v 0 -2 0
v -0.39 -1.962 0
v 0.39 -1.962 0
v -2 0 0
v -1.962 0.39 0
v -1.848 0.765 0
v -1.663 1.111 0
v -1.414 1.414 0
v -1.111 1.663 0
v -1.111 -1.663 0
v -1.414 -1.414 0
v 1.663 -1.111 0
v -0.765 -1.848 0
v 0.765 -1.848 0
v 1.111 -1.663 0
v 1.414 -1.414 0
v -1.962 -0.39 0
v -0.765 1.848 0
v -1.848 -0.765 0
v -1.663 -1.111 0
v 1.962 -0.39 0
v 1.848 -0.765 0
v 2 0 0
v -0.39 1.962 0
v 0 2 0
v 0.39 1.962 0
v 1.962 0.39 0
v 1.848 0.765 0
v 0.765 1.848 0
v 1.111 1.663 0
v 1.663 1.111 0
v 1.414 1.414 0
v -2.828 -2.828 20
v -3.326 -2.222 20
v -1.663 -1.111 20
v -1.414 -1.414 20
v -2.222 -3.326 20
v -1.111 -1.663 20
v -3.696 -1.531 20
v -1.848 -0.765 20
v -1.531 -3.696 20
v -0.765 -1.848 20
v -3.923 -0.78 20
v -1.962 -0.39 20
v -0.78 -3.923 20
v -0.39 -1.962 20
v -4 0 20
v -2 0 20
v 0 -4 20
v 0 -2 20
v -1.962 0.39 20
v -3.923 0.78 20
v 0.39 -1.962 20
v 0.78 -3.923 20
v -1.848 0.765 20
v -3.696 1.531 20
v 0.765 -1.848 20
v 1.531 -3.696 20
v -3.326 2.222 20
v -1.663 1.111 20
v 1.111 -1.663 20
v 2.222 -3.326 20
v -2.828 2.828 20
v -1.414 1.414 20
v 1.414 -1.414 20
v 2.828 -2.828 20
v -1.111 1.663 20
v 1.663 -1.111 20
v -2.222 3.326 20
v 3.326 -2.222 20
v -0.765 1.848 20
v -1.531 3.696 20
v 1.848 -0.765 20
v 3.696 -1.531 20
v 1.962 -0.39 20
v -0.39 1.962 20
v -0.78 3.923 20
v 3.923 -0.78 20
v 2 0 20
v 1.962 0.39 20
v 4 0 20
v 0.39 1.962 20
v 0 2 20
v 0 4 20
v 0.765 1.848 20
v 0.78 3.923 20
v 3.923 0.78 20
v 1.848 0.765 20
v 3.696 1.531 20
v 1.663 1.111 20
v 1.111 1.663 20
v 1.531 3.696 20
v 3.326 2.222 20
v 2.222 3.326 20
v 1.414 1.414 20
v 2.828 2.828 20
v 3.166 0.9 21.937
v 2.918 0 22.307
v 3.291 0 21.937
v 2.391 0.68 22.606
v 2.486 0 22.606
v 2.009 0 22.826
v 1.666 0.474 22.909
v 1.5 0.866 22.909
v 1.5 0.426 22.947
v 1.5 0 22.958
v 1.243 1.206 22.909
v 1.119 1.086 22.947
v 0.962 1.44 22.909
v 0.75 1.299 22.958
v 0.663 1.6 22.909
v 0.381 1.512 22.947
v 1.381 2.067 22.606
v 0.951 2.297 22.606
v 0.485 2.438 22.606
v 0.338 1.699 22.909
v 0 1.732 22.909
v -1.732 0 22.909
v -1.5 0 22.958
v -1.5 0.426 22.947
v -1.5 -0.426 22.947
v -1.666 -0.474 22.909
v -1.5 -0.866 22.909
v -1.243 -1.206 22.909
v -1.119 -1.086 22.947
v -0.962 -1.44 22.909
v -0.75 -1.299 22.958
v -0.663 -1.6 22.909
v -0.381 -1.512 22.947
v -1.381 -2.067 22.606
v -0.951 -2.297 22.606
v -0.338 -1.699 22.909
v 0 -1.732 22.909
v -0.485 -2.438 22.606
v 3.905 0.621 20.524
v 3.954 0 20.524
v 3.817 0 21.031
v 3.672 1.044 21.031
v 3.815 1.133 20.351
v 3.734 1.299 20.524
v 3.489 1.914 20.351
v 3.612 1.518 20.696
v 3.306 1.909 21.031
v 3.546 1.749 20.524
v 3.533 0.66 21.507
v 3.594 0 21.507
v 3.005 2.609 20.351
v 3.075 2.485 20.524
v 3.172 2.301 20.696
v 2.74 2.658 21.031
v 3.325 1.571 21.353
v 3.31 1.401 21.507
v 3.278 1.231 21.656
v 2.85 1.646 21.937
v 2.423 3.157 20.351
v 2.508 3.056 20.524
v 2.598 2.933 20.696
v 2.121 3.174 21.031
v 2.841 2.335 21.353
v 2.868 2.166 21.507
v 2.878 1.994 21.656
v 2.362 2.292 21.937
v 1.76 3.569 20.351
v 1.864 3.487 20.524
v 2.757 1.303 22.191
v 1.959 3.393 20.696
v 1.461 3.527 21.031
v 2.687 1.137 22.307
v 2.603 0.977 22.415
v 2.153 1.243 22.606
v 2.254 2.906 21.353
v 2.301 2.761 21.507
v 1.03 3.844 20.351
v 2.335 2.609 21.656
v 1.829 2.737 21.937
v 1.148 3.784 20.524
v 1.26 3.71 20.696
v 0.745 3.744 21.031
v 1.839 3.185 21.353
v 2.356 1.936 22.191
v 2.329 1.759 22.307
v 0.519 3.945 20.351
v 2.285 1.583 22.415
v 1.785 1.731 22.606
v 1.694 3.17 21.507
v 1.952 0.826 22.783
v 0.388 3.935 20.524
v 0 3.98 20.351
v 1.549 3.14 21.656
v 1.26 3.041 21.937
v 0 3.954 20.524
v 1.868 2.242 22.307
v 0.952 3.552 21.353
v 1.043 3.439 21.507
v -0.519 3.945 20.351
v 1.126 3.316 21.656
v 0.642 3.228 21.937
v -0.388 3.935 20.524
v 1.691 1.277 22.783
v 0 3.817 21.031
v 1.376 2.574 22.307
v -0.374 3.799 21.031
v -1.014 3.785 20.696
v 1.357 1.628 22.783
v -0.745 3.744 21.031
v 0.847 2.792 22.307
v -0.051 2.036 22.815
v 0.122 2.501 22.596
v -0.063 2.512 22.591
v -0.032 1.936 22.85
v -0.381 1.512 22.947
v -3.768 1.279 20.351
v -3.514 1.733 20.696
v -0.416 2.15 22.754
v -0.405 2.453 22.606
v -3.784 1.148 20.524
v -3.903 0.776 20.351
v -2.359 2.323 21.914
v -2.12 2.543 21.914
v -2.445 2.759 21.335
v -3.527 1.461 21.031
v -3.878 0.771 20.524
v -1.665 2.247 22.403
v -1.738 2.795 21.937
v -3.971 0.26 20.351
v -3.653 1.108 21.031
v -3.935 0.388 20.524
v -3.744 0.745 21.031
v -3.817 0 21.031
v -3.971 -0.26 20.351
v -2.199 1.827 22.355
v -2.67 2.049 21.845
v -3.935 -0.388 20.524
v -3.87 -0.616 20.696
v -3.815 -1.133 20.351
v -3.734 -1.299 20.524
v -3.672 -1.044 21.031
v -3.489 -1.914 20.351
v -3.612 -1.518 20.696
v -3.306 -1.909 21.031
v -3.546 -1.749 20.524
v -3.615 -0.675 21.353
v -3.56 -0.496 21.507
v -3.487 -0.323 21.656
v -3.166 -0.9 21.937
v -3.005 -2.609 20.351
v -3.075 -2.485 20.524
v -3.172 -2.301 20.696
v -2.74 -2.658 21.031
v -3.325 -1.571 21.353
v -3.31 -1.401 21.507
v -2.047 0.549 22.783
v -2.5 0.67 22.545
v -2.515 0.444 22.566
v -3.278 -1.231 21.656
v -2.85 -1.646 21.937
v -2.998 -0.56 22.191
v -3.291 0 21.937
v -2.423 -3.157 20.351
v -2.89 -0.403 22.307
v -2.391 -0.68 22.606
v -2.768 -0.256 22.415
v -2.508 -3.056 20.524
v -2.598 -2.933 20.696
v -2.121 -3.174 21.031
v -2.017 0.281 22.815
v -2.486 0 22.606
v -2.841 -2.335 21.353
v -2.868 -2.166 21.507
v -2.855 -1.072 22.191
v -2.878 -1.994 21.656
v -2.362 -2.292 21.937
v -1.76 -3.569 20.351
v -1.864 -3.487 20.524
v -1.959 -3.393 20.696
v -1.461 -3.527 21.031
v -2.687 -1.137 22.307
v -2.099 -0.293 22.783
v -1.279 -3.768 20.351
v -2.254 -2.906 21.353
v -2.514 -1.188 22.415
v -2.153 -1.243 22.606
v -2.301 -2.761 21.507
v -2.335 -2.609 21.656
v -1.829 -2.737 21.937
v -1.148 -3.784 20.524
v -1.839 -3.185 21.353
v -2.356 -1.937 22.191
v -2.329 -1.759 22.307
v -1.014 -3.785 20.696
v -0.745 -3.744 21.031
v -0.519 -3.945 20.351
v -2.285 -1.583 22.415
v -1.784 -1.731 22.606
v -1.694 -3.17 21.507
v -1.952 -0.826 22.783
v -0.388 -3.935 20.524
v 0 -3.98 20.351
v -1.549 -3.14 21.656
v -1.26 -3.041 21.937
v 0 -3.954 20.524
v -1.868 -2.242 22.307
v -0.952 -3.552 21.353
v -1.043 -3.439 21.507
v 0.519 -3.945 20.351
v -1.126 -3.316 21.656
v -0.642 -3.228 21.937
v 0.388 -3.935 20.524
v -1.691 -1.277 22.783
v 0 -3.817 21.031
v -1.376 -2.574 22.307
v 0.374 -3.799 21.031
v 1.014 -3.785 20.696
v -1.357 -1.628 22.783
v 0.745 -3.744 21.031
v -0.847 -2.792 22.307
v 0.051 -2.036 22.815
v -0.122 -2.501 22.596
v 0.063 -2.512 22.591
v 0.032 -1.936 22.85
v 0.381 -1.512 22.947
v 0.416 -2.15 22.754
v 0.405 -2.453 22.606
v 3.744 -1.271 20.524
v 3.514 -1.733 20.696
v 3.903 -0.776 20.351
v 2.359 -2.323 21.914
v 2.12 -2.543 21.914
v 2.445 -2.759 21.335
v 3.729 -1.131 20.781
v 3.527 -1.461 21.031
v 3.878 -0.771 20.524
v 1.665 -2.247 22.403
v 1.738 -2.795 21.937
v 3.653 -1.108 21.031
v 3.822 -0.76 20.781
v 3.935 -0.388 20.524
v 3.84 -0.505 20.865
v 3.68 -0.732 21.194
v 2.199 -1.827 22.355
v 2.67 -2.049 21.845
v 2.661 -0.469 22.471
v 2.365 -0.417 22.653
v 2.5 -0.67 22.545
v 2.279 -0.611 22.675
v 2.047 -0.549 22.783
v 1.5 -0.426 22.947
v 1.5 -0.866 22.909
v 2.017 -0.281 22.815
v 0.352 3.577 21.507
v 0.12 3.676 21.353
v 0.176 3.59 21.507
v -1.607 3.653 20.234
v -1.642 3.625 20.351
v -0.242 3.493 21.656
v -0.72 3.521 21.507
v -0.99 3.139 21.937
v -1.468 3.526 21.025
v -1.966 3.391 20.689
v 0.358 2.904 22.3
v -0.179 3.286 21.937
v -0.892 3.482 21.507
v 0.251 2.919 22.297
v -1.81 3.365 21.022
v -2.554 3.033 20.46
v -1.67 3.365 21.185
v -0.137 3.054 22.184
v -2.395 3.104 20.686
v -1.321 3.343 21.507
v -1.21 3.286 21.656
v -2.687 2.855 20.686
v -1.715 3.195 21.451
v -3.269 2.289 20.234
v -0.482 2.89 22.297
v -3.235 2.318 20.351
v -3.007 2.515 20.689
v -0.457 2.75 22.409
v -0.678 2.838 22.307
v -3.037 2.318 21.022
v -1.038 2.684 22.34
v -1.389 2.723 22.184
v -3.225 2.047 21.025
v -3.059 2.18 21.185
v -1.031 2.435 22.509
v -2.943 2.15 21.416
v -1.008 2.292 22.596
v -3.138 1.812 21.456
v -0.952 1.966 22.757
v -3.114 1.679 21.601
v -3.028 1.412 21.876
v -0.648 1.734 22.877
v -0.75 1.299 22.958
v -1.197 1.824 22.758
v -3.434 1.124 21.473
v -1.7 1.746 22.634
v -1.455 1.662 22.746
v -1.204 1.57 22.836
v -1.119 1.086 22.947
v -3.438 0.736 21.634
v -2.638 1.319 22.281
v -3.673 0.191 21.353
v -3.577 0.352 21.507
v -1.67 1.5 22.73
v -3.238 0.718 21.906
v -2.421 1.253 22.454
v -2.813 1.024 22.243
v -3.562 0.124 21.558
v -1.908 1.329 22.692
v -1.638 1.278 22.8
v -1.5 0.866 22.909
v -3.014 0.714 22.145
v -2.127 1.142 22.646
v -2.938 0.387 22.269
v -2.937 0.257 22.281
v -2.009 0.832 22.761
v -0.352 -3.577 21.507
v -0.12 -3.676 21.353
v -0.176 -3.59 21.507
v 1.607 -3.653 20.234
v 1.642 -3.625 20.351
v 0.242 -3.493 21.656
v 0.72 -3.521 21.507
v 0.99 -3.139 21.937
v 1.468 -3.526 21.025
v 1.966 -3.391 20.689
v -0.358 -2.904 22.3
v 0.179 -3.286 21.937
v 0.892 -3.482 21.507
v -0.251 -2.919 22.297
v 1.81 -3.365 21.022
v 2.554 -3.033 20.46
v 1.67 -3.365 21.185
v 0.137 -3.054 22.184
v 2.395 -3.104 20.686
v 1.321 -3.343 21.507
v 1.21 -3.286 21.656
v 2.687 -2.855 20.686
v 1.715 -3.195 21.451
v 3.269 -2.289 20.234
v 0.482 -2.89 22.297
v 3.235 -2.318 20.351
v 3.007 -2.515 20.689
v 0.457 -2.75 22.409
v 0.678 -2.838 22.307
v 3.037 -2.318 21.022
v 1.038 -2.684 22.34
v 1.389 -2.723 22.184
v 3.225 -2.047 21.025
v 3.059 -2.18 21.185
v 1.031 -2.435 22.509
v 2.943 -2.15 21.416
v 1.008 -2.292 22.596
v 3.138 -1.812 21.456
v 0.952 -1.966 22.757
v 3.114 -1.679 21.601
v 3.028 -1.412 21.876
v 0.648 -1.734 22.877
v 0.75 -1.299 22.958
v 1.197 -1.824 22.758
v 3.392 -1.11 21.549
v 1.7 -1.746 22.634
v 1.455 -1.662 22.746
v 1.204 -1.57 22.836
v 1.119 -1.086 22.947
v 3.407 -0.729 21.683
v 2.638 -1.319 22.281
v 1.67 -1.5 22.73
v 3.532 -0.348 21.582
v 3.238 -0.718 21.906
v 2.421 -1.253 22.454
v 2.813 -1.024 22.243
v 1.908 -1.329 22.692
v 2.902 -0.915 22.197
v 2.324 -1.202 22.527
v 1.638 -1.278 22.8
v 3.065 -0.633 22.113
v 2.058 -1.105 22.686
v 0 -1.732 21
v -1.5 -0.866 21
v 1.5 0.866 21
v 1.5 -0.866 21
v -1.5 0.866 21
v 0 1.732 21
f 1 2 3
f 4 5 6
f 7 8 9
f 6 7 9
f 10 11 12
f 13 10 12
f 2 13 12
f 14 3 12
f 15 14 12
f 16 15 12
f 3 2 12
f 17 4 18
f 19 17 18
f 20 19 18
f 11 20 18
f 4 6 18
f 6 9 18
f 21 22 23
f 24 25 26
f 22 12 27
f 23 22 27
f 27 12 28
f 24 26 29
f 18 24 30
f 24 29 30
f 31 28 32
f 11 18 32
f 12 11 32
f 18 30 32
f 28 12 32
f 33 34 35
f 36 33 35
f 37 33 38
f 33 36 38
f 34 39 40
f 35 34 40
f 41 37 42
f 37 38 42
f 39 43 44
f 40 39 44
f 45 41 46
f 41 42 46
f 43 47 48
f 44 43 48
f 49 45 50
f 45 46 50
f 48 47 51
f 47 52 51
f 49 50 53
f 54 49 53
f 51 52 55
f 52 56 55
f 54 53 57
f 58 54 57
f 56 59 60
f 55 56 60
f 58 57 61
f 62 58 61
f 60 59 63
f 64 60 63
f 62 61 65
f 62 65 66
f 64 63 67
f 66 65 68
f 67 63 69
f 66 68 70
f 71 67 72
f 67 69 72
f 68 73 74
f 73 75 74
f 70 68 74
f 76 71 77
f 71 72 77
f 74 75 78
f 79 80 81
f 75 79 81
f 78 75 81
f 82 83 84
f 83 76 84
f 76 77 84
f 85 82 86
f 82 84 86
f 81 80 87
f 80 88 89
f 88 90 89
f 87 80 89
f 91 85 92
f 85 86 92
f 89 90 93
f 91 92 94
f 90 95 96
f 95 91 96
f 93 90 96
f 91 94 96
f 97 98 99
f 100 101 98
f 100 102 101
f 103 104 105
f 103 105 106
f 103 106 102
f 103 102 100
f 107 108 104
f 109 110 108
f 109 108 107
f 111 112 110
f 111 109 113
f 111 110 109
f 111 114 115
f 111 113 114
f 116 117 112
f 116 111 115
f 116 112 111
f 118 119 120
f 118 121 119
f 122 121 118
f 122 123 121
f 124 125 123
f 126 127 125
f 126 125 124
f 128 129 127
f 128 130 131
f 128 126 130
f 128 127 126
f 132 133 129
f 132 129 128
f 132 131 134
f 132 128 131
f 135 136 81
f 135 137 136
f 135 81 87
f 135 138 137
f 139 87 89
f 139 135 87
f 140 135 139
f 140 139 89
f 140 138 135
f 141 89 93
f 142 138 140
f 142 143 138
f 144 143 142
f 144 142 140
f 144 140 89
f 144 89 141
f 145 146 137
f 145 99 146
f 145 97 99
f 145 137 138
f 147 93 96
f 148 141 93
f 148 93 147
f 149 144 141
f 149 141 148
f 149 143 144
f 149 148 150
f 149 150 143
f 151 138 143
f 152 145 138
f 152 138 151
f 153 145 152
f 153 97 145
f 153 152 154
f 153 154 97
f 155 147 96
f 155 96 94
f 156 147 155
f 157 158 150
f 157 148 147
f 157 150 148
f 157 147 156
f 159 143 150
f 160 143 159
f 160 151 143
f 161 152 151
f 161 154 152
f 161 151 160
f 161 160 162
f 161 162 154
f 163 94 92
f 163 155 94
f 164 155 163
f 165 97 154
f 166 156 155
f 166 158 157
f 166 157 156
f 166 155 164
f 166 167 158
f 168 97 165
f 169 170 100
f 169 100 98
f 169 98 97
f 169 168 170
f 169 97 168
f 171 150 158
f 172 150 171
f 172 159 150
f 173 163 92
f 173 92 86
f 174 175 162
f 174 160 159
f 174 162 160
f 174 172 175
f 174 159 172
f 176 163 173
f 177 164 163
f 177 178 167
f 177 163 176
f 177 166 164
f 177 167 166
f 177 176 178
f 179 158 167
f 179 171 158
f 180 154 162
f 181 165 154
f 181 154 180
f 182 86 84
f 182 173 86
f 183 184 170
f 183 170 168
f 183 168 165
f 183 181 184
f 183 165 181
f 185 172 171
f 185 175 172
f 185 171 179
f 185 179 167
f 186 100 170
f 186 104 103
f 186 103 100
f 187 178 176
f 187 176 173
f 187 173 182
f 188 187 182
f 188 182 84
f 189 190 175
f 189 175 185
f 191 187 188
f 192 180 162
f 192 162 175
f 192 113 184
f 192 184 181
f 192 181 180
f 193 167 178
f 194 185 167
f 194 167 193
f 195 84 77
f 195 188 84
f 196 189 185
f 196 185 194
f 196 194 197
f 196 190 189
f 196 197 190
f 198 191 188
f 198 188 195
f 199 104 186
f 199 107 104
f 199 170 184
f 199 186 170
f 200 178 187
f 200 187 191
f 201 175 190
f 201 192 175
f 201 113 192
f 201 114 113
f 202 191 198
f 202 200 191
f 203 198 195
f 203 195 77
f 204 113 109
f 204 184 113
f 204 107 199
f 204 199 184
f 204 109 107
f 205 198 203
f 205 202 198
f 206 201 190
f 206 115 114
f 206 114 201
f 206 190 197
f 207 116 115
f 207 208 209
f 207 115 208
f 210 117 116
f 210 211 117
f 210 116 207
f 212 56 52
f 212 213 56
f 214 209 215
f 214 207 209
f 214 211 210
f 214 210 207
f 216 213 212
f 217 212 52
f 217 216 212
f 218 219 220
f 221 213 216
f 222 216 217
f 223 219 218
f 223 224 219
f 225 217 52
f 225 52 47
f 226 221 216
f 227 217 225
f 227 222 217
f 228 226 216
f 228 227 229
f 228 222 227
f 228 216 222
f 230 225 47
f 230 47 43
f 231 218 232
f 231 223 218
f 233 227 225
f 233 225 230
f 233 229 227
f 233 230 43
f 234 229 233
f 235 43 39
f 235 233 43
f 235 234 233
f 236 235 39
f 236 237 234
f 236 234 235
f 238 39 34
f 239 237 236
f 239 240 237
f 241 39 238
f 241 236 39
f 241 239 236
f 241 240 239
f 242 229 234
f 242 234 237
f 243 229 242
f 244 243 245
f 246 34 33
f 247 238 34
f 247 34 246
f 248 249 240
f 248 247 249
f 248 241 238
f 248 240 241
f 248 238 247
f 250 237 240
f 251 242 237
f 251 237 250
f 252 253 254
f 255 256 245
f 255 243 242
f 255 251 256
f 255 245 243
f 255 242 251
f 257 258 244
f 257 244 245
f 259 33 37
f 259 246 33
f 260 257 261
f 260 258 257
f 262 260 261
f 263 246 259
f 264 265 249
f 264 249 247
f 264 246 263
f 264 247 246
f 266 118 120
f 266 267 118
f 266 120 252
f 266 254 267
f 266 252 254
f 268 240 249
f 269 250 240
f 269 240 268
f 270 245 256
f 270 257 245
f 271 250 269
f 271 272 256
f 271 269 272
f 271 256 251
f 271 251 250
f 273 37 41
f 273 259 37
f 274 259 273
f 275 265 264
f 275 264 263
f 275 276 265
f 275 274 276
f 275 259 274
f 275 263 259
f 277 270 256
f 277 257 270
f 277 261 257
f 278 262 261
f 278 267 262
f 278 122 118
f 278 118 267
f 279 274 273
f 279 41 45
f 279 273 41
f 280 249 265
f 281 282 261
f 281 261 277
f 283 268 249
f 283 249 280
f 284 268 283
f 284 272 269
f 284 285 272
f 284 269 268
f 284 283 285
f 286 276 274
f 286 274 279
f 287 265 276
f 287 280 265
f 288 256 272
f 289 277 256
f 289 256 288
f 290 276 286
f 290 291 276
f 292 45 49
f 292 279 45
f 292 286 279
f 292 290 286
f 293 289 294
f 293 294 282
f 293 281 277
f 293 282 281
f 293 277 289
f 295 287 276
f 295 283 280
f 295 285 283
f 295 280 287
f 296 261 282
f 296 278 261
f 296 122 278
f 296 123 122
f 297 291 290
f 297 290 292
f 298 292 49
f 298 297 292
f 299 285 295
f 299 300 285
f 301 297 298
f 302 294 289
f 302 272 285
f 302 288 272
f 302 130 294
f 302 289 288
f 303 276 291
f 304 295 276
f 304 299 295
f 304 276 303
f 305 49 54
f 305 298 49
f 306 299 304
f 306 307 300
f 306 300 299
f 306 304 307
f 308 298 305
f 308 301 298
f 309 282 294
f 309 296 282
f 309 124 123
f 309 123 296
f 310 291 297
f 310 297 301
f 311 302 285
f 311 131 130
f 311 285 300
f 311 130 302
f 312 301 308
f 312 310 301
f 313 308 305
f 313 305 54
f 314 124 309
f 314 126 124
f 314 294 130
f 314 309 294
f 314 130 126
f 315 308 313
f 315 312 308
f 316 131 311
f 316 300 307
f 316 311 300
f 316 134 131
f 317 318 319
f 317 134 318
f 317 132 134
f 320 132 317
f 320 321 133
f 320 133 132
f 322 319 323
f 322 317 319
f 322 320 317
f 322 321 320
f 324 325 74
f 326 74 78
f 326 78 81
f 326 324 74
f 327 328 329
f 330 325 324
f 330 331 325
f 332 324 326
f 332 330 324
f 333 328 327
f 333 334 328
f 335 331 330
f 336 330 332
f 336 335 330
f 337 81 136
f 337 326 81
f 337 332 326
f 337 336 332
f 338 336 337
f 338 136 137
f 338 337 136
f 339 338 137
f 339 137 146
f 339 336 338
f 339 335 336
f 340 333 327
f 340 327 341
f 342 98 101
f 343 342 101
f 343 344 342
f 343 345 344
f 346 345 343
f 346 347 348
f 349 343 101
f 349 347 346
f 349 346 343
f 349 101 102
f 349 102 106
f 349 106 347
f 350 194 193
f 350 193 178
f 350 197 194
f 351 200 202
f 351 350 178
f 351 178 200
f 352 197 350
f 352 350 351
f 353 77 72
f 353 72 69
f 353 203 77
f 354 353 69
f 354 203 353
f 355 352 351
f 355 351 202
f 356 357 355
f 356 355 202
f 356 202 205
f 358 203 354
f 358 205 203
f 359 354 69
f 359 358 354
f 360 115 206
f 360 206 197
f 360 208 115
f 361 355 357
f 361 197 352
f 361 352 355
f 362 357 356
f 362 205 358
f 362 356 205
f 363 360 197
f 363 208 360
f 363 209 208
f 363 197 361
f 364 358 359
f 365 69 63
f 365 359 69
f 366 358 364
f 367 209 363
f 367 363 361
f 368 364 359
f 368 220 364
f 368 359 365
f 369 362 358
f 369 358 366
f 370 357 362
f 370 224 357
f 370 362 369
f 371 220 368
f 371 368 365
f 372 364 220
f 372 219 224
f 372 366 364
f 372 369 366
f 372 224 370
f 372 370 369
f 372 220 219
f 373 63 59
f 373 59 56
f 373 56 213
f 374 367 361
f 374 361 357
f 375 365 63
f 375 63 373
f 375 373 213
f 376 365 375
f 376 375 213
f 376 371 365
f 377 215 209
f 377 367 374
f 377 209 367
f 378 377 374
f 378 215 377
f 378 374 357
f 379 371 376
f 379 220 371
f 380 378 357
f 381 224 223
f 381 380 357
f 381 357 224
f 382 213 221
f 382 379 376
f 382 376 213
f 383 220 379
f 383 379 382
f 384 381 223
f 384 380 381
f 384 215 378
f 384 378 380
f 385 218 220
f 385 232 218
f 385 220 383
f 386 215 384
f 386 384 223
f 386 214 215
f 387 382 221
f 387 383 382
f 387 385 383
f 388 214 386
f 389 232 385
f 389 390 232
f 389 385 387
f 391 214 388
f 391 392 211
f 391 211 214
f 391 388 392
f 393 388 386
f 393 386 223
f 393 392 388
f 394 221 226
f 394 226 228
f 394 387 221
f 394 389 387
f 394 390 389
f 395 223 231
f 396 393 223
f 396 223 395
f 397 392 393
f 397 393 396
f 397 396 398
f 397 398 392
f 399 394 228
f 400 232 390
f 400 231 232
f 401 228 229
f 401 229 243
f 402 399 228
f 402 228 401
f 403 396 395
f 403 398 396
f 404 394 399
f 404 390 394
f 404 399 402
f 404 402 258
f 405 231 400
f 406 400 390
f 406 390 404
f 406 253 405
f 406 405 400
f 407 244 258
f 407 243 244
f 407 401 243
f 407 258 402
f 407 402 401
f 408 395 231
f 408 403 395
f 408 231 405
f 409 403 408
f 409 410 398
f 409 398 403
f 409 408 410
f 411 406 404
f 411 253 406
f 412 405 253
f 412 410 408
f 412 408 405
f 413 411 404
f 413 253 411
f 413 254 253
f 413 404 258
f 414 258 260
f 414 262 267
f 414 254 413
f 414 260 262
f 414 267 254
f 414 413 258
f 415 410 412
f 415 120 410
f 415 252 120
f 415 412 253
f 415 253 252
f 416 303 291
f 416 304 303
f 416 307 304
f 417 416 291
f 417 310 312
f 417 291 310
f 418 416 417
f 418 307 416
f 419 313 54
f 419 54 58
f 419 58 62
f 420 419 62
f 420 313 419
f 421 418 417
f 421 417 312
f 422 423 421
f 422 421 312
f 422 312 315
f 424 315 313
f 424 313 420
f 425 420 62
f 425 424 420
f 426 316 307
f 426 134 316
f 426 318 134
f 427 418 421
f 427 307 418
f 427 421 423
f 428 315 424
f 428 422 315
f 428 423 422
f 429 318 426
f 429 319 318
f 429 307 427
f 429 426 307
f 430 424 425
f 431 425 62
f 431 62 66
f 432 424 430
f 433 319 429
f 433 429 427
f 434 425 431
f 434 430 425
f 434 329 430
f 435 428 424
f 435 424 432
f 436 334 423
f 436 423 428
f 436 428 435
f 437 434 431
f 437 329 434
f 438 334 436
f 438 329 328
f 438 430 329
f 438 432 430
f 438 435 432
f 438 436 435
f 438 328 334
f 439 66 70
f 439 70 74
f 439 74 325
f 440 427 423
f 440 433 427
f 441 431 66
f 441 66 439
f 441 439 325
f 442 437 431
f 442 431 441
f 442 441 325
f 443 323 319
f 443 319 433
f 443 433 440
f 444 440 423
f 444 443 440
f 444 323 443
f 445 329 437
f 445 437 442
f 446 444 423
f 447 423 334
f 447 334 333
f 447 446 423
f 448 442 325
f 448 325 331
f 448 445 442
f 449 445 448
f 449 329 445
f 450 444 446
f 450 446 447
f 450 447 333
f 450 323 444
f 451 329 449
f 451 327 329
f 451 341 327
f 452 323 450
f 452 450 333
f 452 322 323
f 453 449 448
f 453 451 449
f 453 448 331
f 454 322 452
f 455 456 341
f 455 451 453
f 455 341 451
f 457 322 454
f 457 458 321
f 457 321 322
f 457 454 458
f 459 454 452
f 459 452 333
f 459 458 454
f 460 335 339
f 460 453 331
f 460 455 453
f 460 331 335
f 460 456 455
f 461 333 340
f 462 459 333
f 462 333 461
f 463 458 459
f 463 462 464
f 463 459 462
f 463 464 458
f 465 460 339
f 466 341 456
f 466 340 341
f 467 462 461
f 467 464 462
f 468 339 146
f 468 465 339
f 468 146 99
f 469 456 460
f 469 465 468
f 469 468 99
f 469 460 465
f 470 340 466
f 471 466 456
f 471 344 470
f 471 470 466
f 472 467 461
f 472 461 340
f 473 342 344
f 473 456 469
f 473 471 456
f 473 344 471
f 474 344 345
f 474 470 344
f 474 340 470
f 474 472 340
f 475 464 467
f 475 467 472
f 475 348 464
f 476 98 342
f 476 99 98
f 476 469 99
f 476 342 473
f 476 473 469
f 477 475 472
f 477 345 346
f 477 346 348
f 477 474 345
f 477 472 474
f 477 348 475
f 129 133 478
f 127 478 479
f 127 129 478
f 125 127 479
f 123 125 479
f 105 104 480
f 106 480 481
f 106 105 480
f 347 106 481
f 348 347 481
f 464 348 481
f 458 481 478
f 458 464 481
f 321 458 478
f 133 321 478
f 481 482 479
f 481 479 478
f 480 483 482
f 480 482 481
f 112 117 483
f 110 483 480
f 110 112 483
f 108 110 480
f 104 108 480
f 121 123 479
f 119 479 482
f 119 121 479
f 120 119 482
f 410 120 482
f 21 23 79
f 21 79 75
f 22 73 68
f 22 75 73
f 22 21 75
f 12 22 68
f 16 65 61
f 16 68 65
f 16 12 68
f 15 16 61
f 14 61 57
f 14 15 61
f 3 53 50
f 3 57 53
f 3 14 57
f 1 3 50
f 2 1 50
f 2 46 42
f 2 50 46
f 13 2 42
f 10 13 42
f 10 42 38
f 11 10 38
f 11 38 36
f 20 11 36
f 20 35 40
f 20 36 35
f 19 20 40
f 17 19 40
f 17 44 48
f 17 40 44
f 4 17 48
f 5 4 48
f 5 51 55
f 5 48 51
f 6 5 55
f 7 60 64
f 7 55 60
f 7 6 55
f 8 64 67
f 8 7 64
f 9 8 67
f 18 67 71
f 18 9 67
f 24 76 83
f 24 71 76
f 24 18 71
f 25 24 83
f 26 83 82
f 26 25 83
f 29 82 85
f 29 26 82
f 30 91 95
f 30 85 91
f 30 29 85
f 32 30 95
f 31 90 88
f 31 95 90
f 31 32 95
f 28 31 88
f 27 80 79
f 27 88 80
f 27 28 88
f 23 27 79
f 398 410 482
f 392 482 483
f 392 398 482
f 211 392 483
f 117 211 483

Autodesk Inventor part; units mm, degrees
ref_plane "YZ Plane" through (0, 0, 0) normal (1, 0, 0) x (0, 1, 0)
ref_plane "XZ Plane" through (0, 0, 0) normal (0, 1, 0) x (-1, 0, 0)
ref_plane "XY Plane" through (0, 0, 0) normal (0, 0, 1) x (1, 0, 0)
sketch "スケッチ1" plane through (0, 0, 0) normal (0, 0, 1) x (1, 0, 0)
  circle A0 centre (0, 0) radius 2
  dimension "d0" = 4
extrude "押し出し1" add sketch "スケッチ1" along normal blind 20
sketch "スケッチ2" plane through (0, 0, 20) normal (0, 0, 1) x (1, 0, 0)
  circle A0 centre (0, 0) radius 2 projected
  circle A1 centre (0, 0) radius 4
  dimension "d3" = 8
extrude "押し出し2" add sketch "スケッチ2" along normal blind 3 contours A0 | A1
fillet "フィレット1" radius 3 1 edges at (-4, 0, 23)
thread "ねじ1" size "M4x0.7" class "6g" standard "ANSI Metric M Profile" full length
sketch "スケッチ3" plane through (0, 0, 23) normal (0, 0, 1) x (1, 0, 0)
  line L0 (-1.5, 0.866) -> (0, 1.7321)
  line L1 (0, 1.7321) -> (1.5, 0.866)
  line L2 (1.5, 0.866) -> (1.5, -0.866)
  line L3 (1.5, -0.866) -> (0, -1.7321)
  line L4 (0, -1.7321) -> (-1.5, -0.866)
  line L5 (-1.5, -0.866) -> (-1.5, 0.866)
  point P0 (0, 0)
  point P1 (0, 0)
  point P2 (-1.5, 0)
  dimension "d9" = 3
extrude "押し出し3" cut sketch "スケッチ3" against normal blind 2
properties part number "SB　M4 8mm なべネジ" material "Stainless Steel, 440C"
